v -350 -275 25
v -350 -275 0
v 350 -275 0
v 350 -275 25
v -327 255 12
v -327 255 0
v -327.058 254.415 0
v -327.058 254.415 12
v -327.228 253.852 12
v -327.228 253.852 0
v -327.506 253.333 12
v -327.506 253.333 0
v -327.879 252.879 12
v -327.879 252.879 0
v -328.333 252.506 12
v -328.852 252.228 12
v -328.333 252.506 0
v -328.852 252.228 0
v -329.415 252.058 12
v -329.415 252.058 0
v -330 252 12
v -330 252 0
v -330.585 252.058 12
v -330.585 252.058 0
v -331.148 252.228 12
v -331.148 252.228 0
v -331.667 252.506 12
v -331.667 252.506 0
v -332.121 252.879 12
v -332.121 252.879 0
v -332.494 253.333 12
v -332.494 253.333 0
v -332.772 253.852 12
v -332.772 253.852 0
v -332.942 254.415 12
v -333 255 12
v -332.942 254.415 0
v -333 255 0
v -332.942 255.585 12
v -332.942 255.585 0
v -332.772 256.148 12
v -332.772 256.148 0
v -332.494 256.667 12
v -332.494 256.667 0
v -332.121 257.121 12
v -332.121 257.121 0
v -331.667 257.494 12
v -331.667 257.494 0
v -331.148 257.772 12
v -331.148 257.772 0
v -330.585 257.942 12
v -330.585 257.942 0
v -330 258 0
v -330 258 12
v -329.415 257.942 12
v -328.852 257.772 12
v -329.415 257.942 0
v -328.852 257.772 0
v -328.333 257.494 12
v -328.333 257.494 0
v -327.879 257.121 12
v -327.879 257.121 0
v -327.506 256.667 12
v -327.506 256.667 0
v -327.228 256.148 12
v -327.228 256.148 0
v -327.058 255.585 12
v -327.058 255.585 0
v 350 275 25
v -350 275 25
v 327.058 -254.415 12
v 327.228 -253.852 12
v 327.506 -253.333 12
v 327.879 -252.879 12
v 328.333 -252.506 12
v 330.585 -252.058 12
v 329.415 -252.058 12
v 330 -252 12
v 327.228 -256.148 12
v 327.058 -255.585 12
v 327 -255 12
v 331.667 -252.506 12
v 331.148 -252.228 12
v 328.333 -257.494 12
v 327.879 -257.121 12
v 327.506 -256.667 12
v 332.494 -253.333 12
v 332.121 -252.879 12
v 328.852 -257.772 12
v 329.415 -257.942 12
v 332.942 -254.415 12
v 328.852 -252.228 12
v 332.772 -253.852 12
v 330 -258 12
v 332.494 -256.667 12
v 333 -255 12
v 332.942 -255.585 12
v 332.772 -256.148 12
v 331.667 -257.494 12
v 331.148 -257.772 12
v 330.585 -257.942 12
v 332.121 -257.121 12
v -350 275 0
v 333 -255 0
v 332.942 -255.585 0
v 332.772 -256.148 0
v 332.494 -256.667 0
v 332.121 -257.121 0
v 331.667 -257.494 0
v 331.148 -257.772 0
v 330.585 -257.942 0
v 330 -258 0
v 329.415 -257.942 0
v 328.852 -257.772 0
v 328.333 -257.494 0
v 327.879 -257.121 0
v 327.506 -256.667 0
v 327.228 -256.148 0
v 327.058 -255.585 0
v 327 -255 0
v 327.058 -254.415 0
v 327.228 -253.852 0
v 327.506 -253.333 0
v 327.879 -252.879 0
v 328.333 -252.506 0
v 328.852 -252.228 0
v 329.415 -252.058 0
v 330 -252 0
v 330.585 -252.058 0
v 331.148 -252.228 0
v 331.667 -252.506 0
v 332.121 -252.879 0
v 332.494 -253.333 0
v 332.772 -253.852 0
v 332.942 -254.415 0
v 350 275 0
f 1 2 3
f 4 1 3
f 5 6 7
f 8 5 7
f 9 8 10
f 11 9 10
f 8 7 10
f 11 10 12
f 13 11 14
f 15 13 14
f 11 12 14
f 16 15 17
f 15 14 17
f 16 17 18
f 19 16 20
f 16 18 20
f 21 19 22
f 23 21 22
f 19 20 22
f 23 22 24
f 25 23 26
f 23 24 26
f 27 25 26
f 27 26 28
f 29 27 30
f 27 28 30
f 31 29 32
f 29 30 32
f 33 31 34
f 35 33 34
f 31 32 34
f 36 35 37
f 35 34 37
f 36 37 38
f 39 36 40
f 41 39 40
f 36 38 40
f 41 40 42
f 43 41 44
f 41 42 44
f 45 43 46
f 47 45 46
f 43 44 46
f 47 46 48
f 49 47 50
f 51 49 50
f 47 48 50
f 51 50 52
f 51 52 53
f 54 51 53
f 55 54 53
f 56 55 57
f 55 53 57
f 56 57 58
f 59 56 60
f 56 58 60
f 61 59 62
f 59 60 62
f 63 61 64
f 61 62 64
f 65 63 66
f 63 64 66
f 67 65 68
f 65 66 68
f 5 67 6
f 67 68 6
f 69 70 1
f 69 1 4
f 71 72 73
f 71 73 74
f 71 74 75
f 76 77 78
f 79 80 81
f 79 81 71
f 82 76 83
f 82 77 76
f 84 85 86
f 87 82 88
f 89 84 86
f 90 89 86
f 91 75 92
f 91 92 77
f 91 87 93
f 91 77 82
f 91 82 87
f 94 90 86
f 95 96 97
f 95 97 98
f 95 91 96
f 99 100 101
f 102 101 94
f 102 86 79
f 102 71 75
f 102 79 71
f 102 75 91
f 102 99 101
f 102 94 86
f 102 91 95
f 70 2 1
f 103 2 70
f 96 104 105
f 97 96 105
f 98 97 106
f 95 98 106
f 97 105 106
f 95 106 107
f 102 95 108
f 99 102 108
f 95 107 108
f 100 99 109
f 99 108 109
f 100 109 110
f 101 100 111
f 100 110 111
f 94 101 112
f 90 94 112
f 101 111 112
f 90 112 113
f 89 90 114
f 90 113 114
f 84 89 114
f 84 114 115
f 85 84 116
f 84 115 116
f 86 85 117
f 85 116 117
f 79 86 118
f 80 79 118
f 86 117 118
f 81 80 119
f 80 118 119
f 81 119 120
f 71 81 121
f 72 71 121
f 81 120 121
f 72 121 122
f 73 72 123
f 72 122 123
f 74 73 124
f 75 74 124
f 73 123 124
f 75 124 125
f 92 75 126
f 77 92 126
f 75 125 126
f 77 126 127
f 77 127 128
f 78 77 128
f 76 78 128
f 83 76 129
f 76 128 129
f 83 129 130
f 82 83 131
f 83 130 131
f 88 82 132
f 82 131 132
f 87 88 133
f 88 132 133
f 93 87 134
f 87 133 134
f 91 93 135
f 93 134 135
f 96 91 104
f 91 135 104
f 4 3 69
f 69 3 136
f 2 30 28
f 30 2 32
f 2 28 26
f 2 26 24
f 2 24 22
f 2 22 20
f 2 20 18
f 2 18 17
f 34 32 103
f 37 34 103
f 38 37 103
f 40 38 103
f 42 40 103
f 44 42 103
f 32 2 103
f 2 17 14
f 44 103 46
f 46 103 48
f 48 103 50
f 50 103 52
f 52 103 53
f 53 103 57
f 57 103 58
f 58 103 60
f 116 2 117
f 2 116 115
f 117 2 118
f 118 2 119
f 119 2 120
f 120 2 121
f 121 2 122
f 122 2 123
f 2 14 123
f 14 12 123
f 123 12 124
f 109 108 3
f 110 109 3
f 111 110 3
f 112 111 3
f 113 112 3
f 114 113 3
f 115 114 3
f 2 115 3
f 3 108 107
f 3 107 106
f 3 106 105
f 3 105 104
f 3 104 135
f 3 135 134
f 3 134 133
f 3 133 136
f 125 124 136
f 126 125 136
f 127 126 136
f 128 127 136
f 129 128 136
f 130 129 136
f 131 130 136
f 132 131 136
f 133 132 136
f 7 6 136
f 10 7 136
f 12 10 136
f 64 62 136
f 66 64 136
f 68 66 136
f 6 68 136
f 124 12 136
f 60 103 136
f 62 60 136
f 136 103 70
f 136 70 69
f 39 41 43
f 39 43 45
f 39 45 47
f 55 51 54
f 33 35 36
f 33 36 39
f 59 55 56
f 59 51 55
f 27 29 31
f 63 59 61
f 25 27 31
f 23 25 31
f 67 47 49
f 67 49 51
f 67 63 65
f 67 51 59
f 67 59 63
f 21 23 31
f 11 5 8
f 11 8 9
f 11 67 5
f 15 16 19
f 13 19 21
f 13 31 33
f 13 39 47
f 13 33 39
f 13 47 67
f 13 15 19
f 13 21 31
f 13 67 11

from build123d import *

# Parameters (mm, degrees)
F0_W     = 700
F0_H     = 550
F1_DEPTH = 25
F2_R     = 3
F3_DEPTH = 12
F4_R     = 3
F5_DEPTH = 12


with BuildPart() as f1:
    # F0 (on Top) → F1 (new body)
    with BuildSketch(Plane.XY):
        Rectangle(F0_W, F0_H)
    extrude(amount=F1_DEPTH)

    # F2 (on face) → F3 (cut)
    with BuildSketch(Plane(origin=(0, 0, 0), x_dir=(1, 0, 0), z_dir=(0, 0, -1))):
        with Locations((330, 255)):
            Circle(F2_R)
    extrude(amount=-F3_DEPTH, mode=Mode.SUBTRACT)

    # F4 (on face) → F5 (cut)
    with BuildSketch(Plane(origin=(0, 0, 0), x_dir=(1, 0, 0), z_dir=(0, 0, -1))):
        with Locations((-330, -255)):
            Circle(F4_R)
    extrude(amount=-F5_DEPTH, mode=Mode.SUBTRACT)


solid = f1.part
